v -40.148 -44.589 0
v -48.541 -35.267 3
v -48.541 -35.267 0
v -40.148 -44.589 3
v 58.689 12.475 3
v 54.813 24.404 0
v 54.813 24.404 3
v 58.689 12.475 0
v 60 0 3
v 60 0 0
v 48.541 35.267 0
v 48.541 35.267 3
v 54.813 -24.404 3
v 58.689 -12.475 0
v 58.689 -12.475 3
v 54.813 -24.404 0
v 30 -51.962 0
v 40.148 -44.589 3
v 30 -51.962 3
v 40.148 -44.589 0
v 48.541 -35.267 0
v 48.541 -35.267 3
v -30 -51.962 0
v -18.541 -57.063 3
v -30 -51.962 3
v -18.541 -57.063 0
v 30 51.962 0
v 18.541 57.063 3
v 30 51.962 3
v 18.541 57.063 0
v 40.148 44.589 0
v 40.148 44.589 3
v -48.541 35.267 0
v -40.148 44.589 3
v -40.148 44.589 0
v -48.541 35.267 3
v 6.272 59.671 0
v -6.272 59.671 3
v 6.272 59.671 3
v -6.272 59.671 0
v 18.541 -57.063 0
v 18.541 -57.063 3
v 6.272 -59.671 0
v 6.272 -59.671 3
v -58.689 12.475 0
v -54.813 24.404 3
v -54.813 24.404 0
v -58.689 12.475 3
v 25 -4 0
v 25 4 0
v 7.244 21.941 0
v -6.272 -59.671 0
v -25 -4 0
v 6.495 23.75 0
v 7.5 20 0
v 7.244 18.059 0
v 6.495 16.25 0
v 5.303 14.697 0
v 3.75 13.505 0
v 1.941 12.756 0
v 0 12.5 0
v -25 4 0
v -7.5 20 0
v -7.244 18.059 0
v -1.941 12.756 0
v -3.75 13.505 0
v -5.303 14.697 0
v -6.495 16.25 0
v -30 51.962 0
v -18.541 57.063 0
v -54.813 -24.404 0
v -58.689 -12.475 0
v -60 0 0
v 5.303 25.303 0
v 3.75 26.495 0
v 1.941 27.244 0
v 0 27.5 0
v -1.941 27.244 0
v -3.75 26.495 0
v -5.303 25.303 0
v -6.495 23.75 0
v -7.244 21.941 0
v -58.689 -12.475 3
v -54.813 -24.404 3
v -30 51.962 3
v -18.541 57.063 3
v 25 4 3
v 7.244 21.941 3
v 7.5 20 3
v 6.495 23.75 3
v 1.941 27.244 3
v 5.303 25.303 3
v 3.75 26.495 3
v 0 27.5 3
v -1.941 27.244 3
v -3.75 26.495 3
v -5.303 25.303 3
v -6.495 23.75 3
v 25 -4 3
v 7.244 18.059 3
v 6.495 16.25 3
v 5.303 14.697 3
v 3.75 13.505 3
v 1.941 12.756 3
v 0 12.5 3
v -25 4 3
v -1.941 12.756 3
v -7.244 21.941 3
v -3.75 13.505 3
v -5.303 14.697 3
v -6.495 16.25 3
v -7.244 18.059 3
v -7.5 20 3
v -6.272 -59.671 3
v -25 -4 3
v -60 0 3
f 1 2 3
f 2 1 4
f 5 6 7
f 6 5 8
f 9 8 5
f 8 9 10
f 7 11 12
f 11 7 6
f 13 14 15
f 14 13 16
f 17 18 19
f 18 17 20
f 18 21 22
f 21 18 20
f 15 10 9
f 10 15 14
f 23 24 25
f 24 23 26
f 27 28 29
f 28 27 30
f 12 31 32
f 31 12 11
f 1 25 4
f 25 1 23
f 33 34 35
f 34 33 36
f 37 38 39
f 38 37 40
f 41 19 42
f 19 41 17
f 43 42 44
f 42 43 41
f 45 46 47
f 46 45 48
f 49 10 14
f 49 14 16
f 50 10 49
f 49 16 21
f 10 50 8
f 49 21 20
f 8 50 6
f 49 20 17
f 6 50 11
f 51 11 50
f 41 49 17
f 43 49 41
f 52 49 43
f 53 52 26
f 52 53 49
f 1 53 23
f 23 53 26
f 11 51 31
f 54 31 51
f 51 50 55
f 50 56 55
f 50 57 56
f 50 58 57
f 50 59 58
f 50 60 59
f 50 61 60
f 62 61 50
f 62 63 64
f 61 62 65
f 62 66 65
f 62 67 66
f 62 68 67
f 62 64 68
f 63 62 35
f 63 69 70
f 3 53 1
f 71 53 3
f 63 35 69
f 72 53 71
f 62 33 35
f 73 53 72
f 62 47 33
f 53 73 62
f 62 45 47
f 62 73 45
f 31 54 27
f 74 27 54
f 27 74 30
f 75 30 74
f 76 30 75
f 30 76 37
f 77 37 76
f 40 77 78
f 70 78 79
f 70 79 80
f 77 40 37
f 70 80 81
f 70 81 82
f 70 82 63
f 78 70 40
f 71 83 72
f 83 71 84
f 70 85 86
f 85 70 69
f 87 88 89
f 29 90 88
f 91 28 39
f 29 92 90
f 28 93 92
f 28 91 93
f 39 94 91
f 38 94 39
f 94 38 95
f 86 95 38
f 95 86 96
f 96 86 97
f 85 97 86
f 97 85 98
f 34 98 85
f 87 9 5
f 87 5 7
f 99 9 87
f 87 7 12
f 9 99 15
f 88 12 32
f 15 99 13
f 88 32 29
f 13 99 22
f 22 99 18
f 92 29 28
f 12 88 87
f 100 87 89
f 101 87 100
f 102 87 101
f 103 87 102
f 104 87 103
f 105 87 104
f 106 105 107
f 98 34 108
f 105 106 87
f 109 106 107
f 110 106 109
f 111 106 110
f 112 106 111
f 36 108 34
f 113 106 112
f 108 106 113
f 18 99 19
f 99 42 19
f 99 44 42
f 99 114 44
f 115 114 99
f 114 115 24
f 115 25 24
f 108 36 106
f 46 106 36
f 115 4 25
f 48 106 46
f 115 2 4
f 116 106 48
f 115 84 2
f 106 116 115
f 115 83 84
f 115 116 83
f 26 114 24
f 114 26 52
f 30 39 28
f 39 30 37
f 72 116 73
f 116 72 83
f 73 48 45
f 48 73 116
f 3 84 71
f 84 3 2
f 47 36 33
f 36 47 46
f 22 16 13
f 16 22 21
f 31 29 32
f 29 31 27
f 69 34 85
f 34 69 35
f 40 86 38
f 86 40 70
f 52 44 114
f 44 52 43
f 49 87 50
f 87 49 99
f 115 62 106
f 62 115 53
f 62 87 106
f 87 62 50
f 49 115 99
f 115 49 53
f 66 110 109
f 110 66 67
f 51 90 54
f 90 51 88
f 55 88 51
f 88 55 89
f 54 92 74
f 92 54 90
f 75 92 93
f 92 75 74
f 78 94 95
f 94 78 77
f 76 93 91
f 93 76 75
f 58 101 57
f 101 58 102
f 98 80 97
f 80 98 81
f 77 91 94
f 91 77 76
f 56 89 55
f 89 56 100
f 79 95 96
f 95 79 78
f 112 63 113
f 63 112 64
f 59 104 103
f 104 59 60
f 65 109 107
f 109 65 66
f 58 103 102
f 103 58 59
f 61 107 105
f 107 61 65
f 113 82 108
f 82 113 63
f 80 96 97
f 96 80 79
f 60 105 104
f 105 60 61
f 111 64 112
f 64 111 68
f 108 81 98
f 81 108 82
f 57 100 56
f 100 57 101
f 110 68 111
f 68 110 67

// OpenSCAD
use <MCAD/shapes.scad>

baseheight=3;
baseradius=60;

baseholewidth=50;
baseholeheight=8;

baseservoholeradius=7.5;
baseservoholeoffset=20;


module baseplate()
{



difference(){


	difference() {
 cylinder(r=baseradius,h=baseheight);
cube([baseholewidth, baseholeheight, baseholeheight], center = true);
}
translate([0, baseservoholeoffset, 0])
cylinder(r=baseservoholeradius,h=baseholeheight);


}

}


baseplate();

/*
module example002()
{
	intersection() {
		difference() {
			union() {
				cube([30, 30, 30], center = true);
				translate([0, 0, -25])
					cube([15, 15, 50], center = true);
			}
			union() {
				cube([50, 10, 10], center = true);
				cube([10, 50, 10], center = true);
				cube([10, 10, 50], center = true);
			}
		}
		translate([0, 0, 5])
			cylinder(h = 50, r1 = 20, r2 = 5, center = true);
	}
}
*/
